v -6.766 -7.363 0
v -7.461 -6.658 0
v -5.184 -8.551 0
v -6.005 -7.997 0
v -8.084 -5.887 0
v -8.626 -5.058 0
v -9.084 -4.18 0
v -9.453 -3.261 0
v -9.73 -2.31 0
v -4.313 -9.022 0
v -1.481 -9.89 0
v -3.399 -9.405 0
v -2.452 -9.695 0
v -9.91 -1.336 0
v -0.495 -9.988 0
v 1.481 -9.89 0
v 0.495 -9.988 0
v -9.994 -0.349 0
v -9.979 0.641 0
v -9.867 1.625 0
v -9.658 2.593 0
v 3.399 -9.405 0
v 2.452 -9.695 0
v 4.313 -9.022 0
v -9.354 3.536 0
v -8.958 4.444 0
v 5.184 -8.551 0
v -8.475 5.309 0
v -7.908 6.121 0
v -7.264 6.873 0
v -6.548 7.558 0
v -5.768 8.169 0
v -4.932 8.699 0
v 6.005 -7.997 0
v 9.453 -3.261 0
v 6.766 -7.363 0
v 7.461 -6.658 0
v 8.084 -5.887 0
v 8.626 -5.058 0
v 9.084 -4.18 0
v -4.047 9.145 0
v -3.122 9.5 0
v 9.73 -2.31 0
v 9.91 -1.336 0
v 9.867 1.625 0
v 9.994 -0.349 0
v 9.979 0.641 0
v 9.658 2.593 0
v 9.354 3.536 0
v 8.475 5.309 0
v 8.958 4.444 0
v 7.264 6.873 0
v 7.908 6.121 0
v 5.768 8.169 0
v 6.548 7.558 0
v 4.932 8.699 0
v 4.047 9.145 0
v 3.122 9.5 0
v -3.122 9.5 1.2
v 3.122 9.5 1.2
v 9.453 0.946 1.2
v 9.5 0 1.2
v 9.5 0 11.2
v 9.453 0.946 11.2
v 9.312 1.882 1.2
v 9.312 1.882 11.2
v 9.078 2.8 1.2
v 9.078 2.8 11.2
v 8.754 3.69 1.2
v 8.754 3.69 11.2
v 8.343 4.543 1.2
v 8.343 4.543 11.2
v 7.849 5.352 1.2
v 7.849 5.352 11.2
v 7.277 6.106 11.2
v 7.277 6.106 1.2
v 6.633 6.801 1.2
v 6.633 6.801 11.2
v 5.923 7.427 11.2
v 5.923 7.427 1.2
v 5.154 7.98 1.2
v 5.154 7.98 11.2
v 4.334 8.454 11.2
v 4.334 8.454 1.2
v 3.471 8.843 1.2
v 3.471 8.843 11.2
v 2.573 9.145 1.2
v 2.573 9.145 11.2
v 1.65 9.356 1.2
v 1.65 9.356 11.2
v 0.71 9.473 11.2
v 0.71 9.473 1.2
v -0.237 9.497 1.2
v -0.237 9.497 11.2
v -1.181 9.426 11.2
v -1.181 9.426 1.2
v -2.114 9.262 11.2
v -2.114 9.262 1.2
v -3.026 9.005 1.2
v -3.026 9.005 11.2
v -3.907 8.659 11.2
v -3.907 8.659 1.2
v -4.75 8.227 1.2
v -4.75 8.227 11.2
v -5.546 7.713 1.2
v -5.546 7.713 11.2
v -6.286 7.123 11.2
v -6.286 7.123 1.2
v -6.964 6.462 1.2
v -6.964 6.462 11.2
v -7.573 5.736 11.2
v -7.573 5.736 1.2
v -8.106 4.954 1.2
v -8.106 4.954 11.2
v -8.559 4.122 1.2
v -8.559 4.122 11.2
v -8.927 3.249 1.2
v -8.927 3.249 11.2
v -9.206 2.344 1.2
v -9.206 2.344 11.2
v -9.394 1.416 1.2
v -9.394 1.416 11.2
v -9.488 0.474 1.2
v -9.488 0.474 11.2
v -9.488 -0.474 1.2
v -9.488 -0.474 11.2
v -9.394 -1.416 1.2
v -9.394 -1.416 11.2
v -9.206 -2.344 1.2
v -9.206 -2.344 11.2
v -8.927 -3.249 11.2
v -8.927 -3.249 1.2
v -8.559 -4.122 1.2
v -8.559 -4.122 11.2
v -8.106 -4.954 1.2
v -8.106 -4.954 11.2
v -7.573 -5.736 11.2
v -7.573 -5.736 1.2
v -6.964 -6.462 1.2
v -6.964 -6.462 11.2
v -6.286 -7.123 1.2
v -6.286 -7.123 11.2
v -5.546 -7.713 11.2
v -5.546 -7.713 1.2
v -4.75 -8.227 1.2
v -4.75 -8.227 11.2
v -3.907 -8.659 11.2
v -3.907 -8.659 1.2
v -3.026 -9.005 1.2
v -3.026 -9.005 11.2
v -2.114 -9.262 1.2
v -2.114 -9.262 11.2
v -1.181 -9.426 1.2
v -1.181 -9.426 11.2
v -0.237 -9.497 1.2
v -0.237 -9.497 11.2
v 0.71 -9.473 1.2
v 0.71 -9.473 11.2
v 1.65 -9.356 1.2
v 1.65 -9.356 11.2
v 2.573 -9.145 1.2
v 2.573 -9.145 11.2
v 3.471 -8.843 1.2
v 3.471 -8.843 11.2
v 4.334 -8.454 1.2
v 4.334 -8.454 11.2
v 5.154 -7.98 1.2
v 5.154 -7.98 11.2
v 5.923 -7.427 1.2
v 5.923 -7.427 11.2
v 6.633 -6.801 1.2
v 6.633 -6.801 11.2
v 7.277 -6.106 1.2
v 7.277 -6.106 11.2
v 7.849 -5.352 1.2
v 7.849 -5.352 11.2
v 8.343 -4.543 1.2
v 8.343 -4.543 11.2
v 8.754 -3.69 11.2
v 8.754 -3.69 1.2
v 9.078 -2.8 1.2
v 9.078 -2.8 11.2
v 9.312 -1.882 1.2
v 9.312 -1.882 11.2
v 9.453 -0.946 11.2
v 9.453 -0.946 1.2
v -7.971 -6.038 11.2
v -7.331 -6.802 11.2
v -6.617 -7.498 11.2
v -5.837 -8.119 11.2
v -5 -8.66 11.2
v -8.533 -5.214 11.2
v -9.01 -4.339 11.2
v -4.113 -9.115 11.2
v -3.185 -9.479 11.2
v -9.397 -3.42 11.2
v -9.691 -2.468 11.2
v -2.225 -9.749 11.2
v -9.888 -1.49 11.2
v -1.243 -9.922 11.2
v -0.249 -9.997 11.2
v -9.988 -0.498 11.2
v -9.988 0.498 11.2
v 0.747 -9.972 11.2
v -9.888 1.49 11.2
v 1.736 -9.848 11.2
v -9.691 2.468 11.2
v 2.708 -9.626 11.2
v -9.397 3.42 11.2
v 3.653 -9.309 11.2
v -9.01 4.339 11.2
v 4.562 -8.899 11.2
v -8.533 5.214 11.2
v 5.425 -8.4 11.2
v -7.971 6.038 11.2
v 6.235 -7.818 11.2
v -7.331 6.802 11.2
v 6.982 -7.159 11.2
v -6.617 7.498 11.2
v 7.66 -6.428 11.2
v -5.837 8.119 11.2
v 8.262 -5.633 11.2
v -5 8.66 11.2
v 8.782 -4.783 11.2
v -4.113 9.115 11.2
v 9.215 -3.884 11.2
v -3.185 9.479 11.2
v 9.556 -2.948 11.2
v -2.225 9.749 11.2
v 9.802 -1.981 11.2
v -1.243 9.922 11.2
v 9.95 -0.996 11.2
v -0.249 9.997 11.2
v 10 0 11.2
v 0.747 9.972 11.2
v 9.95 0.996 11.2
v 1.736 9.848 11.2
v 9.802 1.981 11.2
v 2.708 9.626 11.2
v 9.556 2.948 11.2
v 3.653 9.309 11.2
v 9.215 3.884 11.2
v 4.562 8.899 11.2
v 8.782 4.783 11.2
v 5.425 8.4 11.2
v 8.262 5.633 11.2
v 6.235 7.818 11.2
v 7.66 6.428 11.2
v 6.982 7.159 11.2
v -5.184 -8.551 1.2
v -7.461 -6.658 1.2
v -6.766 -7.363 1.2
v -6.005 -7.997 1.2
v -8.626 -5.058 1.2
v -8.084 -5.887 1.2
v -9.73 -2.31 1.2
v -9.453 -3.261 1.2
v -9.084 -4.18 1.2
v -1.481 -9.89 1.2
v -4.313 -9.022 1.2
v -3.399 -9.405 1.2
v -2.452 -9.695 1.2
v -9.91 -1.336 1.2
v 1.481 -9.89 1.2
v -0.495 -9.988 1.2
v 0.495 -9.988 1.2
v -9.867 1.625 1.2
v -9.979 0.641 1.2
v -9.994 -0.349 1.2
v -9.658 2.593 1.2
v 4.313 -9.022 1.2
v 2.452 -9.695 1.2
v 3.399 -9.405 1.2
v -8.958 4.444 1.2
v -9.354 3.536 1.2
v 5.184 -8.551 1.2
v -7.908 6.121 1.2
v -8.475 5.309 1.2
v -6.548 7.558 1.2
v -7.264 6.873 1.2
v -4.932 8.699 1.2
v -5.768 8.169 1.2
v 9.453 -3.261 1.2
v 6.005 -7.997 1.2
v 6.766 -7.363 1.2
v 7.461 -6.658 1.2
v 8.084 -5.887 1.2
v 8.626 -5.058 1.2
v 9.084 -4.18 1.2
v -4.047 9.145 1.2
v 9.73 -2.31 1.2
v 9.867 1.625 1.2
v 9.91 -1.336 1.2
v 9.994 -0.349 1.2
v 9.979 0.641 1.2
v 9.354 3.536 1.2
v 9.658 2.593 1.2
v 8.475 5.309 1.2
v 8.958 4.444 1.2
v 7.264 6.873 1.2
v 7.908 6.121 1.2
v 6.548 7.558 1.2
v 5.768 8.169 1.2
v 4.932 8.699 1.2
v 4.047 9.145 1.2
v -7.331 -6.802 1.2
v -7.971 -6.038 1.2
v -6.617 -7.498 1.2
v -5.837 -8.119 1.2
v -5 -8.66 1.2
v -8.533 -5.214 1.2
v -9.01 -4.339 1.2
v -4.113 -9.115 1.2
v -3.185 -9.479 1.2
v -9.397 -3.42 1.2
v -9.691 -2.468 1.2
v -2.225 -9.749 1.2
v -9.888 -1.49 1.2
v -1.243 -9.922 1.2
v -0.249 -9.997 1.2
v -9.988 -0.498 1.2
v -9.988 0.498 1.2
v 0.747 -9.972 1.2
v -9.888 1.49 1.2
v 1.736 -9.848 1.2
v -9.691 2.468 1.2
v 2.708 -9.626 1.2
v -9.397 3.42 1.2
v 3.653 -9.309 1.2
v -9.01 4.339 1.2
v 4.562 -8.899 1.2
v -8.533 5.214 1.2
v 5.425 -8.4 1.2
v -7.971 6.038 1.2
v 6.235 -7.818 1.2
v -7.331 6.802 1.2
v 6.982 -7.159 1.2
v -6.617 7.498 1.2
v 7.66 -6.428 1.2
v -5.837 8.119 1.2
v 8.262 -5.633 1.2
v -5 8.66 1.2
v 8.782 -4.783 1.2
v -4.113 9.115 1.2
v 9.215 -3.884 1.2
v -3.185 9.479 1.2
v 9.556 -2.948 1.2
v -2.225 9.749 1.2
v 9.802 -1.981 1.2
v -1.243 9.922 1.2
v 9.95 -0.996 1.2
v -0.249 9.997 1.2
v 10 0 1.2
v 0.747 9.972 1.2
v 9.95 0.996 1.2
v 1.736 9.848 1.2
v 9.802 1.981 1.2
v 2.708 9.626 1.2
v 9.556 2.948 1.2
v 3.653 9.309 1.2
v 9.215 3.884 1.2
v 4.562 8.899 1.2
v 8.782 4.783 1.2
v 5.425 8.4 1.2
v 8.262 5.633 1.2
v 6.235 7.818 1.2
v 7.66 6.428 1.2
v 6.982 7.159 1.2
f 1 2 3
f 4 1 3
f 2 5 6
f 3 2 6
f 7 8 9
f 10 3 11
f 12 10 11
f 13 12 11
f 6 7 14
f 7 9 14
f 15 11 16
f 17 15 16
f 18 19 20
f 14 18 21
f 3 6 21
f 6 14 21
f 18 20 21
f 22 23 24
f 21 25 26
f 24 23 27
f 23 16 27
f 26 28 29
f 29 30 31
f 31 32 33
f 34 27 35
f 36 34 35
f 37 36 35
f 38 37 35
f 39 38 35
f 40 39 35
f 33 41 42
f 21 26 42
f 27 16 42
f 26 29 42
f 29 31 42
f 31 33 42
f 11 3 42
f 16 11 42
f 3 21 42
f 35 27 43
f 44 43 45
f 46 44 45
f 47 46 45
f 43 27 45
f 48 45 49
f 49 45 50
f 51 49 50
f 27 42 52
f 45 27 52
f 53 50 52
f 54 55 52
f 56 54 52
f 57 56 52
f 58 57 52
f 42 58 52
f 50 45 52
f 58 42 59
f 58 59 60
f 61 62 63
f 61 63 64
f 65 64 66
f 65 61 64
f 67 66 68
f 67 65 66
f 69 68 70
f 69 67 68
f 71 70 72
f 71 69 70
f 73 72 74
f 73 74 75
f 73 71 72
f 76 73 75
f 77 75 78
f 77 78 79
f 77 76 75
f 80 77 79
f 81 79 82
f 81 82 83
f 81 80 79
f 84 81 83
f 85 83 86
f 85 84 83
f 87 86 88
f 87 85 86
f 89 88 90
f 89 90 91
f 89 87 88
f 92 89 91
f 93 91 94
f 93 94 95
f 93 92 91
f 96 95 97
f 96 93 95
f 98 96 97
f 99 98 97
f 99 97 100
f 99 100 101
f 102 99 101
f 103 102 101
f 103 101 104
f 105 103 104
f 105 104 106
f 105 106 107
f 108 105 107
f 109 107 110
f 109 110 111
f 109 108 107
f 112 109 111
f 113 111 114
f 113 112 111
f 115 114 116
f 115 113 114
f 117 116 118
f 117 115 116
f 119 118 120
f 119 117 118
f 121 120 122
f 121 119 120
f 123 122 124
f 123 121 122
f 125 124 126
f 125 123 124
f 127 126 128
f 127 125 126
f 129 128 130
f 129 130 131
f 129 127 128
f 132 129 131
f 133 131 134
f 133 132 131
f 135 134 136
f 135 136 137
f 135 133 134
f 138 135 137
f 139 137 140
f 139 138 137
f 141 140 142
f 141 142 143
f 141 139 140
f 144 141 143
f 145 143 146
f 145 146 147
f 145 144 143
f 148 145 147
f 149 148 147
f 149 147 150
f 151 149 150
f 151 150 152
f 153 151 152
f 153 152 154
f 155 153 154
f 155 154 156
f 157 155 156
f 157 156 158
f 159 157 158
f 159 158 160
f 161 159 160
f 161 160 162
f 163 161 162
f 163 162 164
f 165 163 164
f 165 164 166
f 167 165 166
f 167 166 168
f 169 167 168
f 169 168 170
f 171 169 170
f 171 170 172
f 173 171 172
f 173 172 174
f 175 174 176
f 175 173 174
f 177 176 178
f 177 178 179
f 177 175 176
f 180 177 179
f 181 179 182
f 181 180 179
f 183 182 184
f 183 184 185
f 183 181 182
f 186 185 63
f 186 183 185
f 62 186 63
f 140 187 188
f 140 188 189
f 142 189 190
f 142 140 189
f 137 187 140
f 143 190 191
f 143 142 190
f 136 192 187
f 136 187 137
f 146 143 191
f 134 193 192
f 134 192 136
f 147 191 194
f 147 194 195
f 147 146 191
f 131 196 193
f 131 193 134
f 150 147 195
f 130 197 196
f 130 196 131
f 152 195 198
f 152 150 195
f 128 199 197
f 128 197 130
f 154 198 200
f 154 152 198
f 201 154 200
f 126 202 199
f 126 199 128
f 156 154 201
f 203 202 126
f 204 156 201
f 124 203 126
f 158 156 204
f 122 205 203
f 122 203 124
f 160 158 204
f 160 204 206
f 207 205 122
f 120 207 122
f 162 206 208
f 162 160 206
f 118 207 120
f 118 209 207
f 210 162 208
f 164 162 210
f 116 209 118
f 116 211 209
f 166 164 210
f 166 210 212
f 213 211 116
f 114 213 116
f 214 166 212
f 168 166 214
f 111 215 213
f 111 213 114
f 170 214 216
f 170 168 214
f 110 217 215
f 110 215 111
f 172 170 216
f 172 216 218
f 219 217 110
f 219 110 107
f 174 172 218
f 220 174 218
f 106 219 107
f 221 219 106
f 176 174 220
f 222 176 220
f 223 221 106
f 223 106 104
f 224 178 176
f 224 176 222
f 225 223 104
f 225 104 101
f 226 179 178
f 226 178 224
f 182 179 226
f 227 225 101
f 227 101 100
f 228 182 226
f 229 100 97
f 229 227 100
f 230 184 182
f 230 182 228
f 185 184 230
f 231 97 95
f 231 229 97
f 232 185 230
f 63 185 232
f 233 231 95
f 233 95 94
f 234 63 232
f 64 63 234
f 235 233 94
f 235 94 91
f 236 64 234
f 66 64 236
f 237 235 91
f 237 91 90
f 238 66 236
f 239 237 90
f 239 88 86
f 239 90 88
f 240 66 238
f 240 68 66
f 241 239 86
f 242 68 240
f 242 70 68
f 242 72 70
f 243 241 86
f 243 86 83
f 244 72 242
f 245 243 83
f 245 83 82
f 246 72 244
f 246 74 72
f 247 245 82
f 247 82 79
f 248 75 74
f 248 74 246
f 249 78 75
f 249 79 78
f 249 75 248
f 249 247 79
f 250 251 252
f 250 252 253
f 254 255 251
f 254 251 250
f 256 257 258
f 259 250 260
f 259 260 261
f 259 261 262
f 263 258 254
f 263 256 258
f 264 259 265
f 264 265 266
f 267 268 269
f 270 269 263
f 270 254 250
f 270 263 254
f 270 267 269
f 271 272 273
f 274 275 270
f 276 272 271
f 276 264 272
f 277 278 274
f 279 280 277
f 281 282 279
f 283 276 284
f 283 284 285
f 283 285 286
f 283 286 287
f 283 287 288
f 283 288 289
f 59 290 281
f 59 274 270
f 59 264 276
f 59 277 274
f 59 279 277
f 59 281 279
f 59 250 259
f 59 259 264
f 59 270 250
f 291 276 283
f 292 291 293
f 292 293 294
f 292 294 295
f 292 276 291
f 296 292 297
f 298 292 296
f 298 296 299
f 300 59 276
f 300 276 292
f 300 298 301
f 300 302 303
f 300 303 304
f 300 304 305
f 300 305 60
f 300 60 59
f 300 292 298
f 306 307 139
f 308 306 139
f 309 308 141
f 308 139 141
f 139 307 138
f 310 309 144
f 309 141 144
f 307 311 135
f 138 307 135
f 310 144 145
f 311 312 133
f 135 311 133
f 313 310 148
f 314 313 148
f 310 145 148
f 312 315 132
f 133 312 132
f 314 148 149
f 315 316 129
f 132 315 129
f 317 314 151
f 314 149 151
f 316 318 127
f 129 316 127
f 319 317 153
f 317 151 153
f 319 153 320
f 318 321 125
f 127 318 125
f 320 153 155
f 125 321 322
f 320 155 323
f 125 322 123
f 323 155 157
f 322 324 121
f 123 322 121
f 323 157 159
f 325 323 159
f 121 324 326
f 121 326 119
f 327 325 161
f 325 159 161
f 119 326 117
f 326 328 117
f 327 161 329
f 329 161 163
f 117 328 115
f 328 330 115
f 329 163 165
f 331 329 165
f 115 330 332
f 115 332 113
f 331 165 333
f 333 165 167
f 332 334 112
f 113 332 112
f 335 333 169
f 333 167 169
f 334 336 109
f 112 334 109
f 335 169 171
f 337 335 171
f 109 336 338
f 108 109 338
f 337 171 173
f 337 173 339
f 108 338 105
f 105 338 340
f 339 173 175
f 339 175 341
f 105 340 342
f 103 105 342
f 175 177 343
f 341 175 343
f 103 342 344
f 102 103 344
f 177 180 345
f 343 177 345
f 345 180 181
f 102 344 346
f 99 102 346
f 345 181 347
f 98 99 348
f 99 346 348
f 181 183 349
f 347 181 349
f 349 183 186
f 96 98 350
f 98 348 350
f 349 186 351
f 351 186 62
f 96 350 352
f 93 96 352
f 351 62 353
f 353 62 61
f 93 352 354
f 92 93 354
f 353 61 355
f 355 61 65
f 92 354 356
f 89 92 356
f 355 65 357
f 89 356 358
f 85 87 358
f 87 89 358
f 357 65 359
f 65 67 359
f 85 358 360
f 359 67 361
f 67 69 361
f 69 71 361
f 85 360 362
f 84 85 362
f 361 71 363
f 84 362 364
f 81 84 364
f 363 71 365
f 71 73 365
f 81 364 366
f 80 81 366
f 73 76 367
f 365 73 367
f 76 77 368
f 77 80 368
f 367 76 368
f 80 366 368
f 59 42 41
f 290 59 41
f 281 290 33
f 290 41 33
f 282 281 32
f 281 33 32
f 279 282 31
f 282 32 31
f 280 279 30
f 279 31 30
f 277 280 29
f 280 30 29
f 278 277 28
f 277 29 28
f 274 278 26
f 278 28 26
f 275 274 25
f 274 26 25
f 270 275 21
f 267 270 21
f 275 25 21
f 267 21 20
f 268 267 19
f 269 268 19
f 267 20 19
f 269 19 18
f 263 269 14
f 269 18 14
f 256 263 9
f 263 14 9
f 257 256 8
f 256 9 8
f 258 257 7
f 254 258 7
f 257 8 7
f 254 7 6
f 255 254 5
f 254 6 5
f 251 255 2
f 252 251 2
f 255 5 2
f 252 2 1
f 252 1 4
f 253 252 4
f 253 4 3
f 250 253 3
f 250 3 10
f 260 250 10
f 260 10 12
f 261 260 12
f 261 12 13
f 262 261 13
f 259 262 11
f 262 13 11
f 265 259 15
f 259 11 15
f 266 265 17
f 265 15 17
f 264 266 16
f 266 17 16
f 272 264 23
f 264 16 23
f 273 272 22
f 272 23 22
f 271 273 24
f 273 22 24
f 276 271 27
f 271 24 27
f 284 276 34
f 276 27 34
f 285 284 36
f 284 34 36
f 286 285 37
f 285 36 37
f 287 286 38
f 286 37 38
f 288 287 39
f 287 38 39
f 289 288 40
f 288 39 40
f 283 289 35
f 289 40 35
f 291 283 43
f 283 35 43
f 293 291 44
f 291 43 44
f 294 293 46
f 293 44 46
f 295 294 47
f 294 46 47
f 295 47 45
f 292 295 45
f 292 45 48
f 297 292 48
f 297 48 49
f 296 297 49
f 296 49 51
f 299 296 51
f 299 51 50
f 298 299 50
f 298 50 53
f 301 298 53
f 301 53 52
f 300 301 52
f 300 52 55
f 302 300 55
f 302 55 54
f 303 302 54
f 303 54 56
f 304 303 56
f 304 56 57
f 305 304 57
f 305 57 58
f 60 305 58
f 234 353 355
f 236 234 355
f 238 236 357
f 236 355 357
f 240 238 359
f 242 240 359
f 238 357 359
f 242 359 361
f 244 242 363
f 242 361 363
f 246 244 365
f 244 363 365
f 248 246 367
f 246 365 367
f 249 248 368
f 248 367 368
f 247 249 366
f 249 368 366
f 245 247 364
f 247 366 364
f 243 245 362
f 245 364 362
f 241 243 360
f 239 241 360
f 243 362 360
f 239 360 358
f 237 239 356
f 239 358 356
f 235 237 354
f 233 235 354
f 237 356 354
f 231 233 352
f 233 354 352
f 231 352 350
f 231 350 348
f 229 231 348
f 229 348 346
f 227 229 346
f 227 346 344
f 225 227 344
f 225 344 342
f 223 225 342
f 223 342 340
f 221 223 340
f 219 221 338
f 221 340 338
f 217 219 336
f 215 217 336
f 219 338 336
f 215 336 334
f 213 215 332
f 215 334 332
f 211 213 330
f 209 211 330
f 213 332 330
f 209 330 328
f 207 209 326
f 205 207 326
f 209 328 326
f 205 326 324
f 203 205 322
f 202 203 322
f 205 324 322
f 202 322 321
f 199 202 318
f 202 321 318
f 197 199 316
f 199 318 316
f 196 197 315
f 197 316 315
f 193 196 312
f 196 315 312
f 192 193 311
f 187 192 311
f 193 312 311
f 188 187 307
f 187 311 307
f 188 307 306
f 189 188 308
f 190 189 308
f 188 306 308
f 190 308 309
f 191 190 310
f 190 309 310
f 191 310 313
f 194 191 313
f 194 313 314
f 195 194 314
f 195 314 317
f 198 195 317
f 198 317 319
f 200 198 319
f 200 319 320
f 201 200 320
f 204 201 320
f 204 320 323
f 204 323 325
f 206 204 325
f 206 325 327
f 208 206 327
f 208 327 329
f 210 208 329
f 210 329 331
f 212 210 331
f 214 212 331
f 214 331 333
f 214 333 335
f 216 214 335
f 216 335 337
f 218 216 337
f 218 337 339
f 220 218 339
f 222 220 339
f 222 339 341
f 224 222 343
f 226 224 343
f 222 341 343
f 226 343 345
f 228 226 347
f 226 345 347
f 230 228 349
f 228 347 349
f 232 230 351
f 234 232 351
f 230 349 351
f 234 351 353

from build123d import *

# Parameters (mm, degrees)
EXTRUDE_SKETCH_DEPTH    = 1.2
SKETCH001_R             = 10
SKETCH001_R_2           = 9.5
EXTRUDE_SKETCH001_DEPTH = 10


with BuildPart() as sketch_extrude:
    # Sketch → Extrude_Sketch (new body)
    with BuildSketch(Plane.XY):
        with BuildLine():
            ThreePointArc((-3.122499, 9.5), (0, -10), (3.122499, 9.5))
            Line((-3.122499, 9.5), (3.122499, 9.5))
        make_face()
    extrude(amount=EXTRUDE_SKETCH_DEPTH)


with BuildPart() as sketch001_extrude:
    # Sketch001 → Extrude_Sketch001 (new body)
    with BuildSketch(Plane.XY.offset(1.2)):
        Circle(SKETCH001_R)
        Circle(SKETCH001_R_2, mode=Mode.SUBTRACT)
    extrude(amount=EXTRUDE_SKETCH001_DEPTH)


solid = Compound([sketch_extrude.part, sketch001_extrude.part])
